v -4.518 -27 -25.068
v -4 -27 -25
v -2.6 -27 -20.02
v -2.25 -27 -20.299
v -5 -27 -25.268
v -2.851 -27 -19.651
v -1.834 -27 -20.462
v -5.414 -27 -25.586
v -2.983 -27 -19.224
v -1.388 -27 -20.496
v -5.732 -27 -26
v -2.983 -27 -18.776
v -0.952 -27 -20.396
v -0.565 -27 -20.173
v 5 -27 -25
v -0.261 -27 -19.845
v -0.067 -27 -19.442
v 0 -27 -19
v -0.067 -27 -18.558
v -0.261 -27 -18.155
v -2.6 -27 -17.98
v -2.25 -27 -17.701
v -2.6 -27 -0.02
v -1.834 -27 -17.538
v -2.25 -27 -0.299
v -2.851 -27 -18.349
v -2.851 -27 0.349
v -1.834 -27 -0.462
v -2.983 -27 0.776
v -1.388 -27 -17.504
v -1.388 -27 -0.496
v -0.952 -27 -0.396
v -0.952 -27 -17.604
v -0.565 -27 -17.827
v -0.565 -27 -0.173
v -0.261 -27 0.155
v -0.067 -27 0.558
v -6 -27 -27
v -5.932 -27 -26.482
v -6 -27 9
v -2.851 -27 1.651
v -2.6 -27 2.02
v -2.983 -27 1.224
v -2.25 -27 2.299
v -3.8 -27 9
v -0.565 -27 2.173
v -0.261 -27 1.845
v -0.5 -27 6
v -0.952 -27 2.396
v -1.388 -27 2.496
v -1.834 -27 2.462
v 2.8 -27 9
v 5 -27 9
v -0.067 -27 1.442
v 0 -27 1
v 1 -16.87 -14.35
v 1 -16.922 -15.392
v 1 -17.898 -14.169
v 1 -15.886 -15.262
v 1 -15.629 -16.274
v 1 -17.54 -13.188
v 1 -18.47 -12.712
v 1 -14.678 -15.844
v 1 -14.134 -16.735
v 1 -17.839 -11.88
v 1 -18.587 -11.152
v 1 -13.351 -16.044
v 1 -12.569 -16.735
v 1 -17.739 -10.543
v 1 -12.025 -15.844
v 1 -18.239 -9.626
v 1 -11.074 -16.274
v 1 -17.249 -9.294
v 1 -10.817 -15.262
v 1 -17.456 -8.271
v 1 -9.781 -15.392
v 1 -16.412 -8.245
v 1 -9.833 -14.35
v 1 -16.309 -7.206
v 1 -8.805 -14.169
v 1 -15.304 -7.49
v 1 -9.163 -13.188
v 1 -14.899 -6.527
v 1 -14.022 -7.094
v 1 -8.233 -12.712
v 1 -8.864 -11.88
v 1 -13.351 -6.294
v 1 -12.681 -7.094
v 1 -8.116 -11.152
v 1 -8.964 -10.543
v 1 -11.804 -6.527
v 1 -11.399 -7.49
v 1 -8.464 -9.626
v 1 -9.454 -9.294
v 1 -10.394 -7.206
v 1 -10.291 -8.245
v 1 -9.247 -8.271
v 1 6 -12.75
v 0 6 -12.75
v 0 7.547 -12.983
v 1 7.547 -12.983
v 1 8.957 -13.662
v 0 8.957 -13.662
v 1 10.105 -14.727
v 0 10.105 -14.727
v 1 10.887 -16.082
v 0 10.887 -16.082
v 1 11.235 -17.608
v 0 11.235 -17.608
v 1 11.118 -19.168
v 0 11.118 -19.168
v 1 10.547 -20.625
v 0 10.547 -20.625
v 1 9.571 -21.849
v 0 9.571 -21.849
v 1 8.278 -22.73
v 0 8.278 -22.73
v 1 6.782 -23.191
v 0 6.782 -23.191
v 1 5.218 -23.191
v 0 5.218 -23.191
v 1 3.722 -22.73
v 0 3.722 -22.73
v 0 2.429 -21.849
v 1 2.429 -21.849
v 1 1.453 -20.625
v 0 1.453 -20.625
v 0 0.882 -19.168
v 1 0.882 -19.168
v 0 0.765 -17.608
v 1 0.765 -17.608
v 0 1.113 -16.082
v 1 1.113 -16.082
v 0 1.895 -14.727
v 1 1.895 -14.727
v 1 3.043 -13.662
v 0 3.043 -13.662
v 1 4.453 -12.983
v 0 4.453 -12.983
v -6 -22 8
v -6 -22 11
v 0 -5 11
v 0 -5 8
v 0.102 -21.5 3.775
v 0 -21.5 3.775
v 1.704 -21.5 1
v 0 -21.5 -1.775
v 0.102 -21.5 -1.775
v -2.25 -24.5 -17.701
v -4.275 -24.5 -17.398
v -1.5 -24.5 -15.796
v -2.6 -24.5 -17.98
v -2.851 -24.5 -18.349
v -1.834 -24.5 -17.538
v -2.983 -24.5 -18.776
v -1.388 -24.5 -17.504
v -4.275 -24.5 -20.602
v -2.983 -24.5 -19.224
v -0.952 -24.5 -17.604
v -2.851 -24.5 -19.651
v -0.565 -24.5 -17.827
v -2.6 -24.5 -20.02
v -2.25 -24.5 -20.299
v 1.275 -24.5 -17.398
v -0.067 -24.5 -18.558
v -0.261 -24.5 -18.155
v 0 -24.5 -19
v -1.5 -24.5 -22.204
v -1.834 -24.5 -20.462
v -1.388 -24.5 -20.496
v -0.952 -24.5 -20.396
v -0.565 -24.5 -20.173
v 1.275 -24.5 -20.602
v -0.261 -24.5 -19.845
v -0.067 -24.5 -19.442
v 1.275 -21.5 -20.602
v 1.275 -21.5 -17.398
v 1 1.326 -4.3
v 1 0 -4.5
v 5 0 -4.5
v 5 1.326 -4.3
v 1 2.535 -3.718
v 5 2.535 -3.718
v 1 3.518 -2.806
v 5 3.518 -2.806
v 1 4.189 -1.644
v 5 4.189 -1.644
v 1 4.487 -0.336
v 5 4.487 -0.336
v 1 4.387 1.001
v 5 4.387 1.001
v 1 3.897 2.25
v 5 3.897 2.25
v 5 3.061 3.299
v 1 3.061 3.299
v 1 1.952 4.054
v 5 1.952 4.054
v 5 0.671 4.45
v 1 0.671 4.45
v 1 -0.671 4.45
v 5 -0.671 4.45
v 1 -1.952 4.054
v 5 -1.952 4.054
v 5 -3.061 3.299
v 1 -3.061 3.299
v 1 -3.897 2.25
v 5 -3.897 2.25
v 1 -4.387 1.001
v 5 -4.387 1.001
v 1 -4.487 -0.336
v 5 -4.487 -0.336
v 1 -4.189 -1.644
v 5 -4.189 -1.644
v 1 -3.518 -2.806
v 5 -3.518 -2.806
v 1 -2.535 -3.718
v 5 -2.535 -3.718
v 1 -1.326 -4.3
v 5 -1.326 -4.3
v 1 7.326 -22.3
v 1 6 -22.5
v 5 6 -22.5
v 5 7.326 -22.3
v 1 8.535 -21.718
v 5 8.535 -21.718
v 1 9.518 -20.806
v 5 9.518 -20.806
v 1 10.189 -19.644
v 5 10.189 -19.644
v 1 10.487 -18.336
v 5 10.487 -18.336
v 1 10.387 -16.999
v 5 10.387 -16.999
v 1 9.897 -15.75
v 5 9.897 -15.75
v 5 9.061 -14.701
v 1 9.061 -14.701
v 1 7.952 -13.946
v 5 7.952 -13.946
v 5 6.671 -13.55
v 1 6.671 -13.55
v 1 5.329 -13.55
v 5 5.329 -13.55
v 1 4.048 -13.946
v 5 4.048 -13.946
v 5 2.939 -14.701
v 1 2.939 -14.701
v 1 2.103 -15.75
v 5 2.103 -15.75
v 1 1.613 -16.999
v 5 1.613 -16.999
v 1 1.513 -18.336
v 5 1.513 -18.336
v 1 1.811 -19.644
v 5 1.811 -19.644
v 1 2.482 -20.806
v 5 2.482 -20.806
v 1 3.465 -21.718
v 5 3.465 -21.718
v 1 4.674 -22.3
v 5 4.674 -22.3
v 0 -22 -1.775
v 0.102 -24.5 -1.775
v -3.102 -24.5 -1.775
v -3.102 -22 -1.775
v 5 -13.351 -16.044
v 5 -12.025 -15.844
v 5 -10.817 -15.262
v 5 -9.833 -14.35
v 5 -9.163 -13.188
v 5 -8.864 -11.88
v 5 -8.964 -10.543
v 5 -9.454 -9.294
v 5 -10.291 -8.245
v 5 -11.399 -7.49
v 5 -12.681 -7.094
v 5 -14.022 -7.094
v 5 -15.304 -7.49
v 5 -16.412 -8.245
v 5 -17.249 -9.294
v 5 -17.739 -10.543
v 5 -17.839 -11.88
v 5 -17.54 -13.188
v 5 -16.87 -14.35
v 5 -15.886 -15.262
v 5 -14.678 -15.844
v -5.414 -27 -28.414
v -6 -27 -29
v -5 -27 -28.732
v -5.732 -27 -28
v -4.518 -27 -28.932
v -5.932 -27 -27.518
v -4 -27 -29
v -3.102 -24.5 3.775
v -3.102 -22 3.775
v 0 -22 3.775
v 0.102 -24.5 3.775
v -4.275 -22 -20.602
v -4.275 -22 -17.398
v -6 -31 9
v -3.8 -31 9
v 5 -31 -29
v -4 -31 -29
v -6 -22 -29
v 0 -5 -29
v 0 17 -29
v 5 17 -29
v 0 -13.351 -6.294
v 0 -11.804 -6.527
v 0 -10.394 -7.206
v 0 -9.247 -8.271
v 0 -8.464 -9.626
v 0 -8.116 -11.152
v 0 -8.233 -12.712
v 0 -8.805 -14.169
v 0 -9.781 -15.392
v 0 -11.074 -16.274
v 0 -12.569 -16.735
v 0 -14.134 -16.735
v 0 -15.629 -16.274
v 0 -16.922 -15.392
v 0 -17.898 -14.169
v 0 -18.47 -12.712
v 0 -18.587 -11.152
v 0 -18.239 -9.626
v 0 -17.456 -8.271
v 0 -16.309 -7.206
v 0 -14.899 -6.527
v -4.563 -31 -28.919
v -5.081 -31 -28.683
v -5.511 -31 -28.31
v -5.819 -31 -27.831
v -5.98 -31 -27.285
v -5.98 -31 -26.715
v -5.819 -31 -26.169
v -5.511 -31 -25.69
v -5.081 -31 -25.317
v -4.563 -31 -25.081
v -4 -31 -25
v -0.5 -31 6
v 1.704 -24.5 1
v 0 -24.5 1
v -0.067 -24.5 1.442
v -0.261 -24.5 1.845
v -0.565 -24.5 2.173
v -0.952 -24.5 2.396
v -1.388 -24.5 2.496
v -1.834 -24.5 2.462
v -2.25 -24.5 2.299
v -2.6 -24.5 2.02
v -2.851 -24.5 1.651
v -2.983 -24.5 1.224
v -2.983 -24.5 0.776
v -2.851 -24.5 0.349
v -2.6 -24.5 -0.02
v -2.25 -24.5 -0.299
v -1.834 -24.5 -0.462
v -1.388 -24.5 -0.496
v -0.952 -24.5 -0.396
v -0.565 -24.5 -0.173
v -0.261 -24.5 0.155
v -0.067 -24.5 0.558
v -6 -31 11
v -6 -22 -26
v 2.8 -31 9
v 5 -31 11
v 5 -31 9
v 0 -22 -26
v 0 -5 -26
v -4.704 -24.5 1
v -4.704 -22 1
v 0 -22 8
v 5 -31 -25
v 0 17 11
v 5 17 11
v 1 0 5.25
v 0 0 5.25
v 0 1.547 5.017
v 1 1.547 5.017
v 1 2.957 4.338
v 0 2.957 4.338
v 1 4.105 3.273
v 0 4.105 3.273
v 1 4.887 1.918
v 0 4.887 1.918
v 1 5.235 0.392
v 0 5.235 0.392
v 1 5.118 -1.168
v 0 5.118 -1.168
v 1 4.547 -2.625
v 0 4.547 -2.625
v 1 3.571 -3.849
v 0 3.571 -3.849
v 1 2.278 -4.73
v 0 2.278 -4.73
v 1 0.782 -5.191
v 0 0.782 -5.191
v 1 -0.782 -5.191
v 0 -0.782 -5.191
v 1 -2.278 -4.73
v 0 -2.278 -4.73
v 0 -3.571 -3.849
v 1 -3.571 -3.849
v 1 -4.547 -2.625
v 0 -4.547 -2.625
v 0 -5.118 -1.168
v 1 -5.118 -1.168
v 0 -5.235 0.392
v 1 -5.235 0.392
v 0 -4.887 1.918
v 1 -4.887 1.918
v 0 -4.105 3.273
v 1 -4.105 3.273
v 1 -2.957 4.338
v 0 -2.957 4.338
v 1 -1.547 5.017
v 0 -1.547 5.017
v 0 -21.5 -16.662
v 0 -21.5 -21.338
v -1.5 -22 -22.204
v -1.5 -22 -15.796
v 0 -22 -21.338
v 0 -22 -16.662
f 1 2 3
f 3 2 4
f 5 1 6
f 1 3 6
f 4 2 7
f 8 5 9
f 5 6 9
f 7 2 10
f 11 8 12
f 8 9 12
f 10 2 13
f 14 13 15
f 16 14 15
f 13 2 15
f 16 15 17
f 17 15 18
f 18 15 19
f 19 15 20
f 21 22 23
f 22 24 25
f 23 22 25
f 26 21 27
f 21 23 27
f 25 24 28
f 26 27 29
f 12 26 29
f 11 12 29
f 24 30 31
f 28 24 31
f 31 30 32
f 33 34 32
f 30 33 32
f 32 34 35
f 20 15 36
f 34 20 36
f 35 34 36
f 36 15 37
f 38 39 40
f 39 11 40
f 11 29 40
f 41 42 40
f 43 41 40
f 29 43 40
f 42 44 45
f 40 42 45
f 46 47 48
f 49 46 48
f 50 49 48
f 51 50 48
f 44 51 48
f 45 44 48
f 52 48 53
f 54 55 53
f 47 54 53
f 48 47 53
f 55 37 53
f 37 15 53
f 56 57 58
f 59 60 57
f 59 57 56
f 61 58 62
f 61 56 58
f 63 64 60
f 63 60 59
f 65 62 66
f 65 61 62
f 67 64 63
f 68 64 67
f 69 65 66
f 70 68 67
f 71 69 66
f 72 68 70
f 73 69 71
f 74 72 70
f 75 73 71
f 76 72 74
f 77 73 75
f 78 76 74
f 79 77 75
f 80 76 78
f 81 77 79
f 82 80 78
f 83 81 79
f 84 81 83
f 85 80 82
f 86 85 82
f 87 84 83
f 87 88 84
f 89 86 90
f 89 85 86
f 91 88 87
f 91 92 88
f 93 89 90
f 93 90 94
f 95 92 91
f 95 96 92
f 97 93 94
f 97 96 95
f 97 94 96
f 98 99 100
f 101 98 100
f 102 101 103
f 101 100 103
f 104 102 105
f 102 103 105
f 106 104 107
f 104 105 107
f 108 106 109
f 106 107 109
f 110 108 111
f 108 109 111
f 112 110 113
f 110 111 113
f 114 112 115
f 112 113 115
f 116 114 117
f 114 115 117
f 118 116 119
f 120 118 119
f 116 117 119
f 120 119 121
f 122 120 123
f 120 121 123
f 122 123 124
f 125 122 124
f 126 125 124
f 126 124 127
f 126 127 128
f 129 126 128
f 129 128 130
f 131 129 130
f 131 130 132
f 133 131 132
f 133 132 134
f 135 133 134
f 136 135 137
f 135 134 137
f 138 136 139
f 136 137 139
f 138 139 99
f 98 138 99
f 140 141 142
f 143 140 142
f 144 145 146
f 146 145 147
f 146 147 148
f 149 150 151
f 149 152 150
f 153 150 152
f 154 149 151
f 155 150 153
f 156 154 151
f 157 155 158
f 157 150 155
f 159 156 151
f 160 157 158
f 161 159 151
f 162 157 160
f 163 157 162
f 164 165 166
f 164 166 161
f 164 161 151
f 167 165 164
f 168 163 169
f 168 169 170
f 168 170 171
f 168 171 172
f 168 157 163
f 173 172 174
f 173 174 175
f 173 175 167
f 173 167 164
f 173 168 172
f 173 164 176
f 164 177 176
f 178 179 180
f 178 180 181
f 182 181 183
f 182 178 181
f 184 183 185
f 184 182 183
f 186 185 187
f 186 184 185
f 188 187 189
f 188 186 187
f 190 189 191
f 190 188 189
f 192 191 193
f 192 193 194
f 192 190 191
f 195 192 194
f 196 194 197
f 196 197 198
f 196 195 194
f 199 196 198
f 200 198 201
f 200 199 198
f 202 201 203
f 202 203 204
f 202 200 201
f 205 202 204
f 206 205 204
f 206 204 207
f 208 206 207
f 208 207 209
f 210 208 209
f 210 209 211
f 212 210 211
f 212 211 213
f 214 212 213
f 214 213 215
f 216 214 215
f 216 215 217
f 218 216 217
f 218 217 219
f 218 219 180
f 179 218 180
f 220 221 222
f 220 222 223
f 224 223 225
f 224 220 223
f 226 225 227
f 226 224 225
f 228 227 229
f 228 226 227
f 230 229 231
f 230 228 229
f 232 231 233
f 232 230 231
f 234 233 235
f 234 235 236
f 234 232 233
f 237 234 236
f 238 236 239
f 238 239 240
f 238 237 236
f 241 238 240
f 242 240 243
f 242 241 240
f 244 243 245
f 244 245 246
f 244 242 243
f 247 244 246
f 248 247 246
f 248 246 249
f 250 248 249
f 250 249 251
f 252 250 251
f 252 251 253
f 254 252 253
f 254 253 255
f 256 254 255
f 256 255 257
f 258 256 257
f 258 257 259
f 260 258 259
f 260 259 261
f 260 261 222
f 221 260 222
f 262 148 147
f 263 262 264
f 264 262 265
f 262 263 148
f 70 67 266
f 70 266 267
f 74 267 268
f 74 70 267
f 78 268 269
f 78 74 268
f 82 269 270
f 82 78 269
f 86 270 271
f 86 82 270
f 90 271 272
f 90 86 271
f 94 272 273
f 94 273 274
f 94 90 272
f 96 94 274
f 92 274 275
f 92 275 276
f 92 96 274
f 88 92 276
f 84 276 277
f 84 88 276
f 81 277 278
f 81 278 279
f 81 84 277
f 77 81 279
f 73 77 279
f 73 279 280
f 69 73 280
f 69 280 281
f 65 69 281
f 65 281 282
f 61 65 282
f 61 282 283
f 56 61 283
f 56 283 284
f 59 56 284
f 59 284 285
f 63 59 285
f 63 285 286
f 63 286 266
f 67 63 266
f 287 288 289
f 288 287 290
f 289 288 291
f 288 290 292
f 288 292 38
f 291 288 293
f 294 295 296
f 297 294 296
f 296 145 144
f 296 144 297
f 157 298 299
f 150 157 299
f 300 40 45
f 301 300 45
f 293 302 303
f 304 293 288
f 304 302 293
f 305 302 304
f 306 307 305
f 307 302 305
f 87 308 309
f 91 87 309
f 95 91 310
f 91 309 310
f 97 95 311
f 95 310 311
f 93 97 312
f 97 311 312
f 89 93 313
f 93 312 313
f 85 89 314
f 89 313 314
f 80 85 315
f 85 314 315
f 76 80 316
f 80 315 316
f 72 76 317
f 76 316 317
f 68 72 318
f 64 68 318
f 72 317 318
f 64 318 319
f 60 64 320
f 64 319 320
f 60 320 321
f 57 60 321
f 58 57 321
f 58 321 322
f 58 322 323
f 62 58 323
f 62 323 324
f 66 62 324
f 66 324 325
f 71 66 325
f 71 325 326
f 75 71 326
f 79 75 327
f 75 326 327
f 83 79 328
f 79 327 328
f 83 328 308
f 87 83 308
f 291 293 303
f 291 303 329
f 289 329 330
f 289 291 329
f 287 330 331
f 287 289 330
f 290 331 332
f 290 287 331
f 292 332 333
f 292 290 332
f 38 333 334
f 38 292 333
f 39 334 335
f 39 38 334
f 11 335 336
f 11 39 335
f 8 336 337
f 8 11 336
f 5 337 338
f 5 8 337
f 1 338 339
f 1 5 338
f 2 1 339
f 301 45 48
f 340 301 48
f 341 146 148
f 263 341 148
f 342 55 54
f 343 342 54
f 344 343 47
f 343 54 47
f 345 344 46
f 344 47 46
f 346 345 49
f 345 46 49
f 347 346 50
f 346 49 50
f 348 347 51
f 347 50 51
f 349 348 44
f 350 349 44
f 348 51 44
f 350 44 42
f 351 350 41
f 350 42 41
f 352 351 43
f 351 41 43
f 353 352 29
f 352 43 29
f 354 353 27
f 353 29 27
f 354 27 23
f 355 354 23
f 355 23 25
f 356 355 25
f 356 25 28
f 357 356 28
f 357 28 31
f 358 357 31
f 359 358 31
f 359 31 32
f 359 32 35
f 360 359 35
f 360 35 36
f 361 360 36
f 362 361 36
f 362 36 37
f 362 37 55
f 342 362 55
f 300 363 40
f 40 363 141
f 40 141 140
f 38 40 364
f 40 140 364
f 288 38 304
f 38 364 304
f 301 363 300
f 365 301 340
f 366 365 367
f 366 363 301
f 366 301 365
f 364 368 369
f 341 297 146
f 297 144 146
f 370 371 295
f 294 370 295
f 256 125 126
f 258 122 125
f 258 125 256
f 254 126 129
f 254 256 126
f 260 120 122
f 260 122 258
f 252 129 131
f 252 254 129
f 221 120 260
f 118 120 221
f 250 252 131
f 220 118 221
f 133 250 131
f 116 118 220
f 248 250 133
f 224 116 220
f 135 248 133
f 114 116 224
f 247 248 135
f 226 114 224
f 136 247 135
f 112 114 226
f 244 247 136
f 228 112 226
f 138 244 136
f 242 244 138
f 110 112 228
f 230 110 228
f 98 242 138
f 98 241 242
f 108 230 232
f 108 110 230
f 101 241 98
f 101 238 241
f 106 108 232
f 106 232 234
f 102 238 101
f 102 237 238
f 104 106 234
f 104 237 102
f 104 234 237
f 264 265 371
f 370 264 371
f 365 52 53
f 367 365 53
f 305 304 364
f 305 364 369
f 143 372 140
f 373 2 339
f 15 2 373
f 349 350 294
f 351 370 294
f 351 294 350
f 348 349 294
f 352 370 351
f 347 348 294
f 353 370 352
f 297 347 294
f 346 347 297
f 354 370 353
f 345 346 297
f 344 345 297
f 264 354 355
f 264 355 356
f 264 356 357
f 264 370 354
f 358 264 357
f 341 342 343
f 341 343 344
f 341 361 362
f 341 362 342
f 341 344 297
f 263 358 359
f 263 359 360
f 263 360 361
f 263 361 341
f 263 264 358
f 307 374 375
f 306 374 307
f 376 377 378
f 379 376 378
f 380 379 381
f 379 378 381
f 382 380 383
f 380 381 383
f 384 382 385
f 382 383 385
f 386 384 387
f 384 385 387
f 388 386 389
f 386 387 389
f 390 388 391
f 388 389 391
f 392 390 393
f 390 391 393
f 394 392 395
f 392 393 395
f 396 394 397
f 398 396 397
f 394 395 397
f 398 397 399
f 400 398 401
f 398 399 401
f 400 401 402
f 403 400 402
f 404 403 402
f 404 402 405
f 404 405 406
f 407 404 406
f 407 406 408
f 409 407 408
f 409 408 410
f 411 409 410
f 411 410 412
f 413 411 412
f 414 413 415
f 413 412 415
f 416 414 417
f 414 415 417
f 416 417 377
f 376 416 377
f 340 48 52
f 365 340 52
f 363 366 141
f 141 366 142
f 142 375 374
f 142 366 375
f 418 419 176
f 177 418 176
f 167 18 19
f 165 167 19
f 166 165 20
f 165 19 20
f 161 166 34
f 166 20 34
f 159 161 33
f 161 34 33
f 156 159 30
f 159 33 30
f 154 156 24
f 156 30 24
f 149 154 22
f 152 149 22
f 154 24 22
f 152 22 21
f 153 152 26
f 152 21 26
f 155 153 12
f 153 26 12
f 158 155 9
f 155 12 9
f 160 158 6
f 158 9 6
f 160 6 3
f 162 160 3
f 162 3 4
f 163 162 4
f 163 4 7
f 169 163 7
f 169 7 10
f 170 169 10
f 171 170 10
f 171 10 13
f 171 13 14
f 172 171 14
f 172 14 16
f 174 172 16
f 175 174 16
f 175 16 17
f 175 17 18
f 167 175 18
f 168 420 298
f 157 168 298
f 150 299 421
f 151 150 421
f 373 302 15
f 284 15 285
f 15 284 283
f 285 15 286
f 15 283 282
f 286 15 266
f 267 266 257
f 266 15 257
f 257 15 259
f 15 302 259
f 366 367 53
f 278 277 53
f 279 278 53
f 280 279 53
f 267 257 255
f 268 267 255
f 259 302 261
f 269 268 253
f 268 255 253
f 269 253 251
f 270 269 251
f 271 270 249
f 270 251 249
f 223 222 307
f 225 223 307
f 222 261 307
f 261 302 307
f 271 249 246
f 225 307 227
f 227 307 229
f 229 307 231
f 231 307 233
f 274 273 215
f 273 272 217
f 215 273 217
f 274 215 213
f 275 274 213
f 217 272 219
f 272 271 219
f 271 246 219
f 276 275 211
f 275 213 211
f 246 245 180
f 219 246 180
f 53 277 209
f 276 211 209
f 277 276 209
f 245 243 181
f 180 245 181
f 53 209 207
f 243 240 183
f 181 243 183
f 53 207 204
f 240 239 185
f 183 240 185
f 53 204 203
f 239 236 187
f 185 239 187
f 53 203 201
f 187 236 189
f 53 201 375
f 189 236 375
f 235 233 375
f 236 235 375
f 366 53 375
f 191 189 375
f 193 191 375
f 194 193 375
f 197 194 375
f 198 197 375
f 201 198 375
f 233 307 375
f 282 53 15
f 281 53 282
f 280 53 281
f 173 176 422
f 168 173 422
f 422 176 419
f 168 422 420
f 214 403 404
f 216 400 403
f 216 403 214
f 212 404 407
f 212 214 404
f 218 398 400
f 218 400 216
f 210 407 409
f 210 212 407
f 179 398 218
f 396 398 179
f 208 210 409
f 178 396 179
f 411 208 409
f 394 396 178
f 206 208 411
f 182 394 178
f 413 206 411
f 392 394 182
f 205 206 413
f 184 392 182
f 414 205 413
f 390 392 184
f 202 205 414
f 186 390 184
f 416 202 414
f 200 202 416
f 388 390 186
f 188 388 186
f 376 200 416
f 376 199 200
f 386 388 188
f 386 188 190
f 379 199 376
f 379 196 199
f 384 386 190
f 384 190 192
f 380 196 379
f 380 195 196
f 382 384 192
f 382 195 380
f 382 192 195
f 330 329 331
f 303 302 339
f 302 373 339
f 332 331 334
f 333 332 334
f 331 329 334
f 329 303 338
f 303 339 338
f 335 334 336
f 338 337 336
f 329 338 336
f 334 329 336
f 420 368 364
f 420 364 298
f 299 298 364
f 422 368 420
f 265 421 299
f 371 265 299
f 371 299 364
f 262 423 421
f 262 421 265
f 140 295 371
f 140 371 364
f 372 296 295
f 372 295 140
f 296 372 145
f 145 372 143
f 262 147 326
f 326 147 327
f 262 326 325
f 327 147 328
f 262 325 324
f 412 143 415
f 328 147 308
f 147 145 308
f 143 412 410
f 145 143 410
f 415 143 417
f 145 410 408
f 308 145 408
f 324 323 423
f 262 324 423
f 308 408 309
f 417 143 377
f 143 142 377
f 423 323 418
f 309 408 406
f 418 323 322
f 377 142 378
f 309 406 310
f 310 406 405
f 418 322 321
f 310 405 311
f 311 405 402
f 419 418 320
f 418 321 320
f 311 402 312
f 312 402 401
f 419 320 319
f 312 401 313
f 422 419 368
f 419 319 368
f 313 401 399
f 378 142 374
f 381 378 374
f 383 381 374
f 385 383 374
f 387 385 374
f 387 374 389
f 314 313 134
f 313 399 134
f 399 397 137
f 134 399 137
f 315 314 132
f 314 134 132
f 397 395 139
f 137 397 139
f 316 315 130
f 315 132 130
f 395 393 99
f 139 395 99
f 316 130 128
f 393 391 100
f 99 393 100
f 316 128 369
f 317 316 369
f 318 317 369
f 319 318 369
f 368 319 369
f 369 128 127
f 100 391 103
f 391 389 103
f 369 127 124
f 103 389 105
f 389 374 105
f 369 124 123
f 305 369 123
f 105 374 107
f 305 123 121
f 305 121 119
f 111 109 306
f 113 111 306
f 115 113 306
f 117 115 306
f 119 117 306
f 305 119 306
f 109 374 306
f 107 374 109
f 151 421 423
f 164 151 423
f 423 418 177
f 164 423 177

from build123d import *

# Parameters (mm, degrees)
SKETCH_1_W               = 40
SKETCH_1_H               = 44
SKETCH_1_R               = 4.5
EXTRUDE_1_DEPTH          = 5
SKETCH_2_R               = 5.25
CUT_EXTRUDE_1_DEPTH      = 1
SKETCH_3_W               = 40
SKETCH_3_H               = 5
EXTRUDE_2_DEPTH          = 6
EXTRUDE_3_DEPTH          = 4
SKETCH_5_R               = 1.5
CUT_EXTRUDE_2_DEPTH      = 5
CUT_EXTRUDE_3_DEPTH      = 0.5
CUT_EXTRUDE_3_DEPTH_BACK = 2.5
EXTRUDE_4_DEPTH          = 3
EXTRUDE_5_DEPTH          = 3


with BuildPart() as part:
    # 草图1 → 凸台-拉伸1 (new body)
    with BuildSketch(Plane(origin=(0, 0, 0), x_dir=(0, 0, -1), z_dir=(1, 0, 0))):
        with Locations((9, -5)):
            Rectangle(SKETCH_1_W, SKETCH_1_H)
        Circle(SKETCH_1_R, mode=Mode.SUBTRACT)
        with Locations((18, 6)):
            Circle(SKETCH_1_R, mode=Mode.SUBTRACT)
        with Locations((11.543885882, -13.351449313)):
            Circle(SKETCH_1_R, mode=Mode.SUBTRACT)
    extrude(amount=EXTRUDE_1_DEPTH)

    # 草图2 → 切除-拉伸1 (cut)
    with BuildSketch(Plane.ZY):
        with Locations((-18, 6)):
            Circle(SKETCH_2_R)
        Circle(SKETCH_2_R)
        with Locations((-11.543885882, -13.351449313)):
            Circle(SKETCH_2_R)
    extrude(amount=-CUT_EXTRUDE_1_DEPTH, mode=Mode.SUBTRACT)

    # 草图3 → 凸台-拉伸2 (add)
    with BuildSketch(Plane.ZY):
        with Locations((-9, -24.5)):
            Rectangle(SKETCH_3_W, SKETCH_3_H)
    extrude(amount=EXTRUDE_2_DEPTH)

    # 草图4 → 凸台-拉伸3 (add)
    with BuildSketch(Plane.XZ.offset(27)):
        Polygon((5, 11), (-6, 11), (-6, 9), (-3.8, 9), (-0.5, 6), (2.8, 9), (5, 9), align=None)
        with BuildLine():
            Line((5, -29), (-4, -29))
            ThreePointArc((-4, -29), (-6, -27), (-4, -25))
            Line((-4, -25), (5, -25))
            Line((5, -25), (5, -29))
        make_face()
    extrude(amount=EXTRUDE_3_DEPTH)

    # 草图5 → 切除-拉伸2 (cut)
    with BuildSketch(Plane.XZ.offset(27)):
        with Locations((-1.5, -19)):
            Circle(SKETCH_5_R)
        with Locations((-1.5, 1)):
            Circle(SKETCH_5_R)
    extrude(amount=-CUT_EXTRUDE_2_DEPTH, mode=Mode.SUBTRACT)

    # 草图6 → 切除-拉伸3 (cut, two sides)
    with BuildSketch(Plane(origin=(0, -22, 0), x_dir=(1, 0, 0), z_dir=(0, 1, 0))) as cut_extrude_3_sk:
        Polygon((-1.5, 15.795706006), (1.275, 17.397853003), (1.275, 20.602146997), (-1.5, 22.204293994), (-4.275, 20.602146997), (-4.275, 17.397853003), align=None)
        Polygon((-4.704293994, -1), (-3.102146997, -3.775), (0.102146997, -3.775), (1.704293994, -1), (0.102146997, 1.775), (-3.102146997, 1.775), align=None)
    extrude(amount=CUT_EXTRUDE_3_DEPTH, mode=Mode.SUBTRACT)
    extrude(cut_extrude_3_sk.sketch, amount=-CUT_EXTRUDE_3_DEPTH_BACK, mode=Mode.SUBTRACT)

    # 草图7 → 凸台-拉伸4 (add)
    with BuildSketch(Plane.XY.offset(11)):
        Polygon((0, -22), (-6, -22), (0, -5), align=None)
    extrude(amount=-EXTRUDE_4_DEPTH)

    # 草图8 → 凸台-拉伸5 (add)
    with BuildSketch(Plane(origin=(0, 0, -29), x_dir=(-1, 0, 0), z_dir=(0, 0, -1))):
        Polygon((0, -22), (6, -22), (0, -5), align=None)
    extrude(amount=-EXTRUDE_5_DEPTH)


solid = part.part
